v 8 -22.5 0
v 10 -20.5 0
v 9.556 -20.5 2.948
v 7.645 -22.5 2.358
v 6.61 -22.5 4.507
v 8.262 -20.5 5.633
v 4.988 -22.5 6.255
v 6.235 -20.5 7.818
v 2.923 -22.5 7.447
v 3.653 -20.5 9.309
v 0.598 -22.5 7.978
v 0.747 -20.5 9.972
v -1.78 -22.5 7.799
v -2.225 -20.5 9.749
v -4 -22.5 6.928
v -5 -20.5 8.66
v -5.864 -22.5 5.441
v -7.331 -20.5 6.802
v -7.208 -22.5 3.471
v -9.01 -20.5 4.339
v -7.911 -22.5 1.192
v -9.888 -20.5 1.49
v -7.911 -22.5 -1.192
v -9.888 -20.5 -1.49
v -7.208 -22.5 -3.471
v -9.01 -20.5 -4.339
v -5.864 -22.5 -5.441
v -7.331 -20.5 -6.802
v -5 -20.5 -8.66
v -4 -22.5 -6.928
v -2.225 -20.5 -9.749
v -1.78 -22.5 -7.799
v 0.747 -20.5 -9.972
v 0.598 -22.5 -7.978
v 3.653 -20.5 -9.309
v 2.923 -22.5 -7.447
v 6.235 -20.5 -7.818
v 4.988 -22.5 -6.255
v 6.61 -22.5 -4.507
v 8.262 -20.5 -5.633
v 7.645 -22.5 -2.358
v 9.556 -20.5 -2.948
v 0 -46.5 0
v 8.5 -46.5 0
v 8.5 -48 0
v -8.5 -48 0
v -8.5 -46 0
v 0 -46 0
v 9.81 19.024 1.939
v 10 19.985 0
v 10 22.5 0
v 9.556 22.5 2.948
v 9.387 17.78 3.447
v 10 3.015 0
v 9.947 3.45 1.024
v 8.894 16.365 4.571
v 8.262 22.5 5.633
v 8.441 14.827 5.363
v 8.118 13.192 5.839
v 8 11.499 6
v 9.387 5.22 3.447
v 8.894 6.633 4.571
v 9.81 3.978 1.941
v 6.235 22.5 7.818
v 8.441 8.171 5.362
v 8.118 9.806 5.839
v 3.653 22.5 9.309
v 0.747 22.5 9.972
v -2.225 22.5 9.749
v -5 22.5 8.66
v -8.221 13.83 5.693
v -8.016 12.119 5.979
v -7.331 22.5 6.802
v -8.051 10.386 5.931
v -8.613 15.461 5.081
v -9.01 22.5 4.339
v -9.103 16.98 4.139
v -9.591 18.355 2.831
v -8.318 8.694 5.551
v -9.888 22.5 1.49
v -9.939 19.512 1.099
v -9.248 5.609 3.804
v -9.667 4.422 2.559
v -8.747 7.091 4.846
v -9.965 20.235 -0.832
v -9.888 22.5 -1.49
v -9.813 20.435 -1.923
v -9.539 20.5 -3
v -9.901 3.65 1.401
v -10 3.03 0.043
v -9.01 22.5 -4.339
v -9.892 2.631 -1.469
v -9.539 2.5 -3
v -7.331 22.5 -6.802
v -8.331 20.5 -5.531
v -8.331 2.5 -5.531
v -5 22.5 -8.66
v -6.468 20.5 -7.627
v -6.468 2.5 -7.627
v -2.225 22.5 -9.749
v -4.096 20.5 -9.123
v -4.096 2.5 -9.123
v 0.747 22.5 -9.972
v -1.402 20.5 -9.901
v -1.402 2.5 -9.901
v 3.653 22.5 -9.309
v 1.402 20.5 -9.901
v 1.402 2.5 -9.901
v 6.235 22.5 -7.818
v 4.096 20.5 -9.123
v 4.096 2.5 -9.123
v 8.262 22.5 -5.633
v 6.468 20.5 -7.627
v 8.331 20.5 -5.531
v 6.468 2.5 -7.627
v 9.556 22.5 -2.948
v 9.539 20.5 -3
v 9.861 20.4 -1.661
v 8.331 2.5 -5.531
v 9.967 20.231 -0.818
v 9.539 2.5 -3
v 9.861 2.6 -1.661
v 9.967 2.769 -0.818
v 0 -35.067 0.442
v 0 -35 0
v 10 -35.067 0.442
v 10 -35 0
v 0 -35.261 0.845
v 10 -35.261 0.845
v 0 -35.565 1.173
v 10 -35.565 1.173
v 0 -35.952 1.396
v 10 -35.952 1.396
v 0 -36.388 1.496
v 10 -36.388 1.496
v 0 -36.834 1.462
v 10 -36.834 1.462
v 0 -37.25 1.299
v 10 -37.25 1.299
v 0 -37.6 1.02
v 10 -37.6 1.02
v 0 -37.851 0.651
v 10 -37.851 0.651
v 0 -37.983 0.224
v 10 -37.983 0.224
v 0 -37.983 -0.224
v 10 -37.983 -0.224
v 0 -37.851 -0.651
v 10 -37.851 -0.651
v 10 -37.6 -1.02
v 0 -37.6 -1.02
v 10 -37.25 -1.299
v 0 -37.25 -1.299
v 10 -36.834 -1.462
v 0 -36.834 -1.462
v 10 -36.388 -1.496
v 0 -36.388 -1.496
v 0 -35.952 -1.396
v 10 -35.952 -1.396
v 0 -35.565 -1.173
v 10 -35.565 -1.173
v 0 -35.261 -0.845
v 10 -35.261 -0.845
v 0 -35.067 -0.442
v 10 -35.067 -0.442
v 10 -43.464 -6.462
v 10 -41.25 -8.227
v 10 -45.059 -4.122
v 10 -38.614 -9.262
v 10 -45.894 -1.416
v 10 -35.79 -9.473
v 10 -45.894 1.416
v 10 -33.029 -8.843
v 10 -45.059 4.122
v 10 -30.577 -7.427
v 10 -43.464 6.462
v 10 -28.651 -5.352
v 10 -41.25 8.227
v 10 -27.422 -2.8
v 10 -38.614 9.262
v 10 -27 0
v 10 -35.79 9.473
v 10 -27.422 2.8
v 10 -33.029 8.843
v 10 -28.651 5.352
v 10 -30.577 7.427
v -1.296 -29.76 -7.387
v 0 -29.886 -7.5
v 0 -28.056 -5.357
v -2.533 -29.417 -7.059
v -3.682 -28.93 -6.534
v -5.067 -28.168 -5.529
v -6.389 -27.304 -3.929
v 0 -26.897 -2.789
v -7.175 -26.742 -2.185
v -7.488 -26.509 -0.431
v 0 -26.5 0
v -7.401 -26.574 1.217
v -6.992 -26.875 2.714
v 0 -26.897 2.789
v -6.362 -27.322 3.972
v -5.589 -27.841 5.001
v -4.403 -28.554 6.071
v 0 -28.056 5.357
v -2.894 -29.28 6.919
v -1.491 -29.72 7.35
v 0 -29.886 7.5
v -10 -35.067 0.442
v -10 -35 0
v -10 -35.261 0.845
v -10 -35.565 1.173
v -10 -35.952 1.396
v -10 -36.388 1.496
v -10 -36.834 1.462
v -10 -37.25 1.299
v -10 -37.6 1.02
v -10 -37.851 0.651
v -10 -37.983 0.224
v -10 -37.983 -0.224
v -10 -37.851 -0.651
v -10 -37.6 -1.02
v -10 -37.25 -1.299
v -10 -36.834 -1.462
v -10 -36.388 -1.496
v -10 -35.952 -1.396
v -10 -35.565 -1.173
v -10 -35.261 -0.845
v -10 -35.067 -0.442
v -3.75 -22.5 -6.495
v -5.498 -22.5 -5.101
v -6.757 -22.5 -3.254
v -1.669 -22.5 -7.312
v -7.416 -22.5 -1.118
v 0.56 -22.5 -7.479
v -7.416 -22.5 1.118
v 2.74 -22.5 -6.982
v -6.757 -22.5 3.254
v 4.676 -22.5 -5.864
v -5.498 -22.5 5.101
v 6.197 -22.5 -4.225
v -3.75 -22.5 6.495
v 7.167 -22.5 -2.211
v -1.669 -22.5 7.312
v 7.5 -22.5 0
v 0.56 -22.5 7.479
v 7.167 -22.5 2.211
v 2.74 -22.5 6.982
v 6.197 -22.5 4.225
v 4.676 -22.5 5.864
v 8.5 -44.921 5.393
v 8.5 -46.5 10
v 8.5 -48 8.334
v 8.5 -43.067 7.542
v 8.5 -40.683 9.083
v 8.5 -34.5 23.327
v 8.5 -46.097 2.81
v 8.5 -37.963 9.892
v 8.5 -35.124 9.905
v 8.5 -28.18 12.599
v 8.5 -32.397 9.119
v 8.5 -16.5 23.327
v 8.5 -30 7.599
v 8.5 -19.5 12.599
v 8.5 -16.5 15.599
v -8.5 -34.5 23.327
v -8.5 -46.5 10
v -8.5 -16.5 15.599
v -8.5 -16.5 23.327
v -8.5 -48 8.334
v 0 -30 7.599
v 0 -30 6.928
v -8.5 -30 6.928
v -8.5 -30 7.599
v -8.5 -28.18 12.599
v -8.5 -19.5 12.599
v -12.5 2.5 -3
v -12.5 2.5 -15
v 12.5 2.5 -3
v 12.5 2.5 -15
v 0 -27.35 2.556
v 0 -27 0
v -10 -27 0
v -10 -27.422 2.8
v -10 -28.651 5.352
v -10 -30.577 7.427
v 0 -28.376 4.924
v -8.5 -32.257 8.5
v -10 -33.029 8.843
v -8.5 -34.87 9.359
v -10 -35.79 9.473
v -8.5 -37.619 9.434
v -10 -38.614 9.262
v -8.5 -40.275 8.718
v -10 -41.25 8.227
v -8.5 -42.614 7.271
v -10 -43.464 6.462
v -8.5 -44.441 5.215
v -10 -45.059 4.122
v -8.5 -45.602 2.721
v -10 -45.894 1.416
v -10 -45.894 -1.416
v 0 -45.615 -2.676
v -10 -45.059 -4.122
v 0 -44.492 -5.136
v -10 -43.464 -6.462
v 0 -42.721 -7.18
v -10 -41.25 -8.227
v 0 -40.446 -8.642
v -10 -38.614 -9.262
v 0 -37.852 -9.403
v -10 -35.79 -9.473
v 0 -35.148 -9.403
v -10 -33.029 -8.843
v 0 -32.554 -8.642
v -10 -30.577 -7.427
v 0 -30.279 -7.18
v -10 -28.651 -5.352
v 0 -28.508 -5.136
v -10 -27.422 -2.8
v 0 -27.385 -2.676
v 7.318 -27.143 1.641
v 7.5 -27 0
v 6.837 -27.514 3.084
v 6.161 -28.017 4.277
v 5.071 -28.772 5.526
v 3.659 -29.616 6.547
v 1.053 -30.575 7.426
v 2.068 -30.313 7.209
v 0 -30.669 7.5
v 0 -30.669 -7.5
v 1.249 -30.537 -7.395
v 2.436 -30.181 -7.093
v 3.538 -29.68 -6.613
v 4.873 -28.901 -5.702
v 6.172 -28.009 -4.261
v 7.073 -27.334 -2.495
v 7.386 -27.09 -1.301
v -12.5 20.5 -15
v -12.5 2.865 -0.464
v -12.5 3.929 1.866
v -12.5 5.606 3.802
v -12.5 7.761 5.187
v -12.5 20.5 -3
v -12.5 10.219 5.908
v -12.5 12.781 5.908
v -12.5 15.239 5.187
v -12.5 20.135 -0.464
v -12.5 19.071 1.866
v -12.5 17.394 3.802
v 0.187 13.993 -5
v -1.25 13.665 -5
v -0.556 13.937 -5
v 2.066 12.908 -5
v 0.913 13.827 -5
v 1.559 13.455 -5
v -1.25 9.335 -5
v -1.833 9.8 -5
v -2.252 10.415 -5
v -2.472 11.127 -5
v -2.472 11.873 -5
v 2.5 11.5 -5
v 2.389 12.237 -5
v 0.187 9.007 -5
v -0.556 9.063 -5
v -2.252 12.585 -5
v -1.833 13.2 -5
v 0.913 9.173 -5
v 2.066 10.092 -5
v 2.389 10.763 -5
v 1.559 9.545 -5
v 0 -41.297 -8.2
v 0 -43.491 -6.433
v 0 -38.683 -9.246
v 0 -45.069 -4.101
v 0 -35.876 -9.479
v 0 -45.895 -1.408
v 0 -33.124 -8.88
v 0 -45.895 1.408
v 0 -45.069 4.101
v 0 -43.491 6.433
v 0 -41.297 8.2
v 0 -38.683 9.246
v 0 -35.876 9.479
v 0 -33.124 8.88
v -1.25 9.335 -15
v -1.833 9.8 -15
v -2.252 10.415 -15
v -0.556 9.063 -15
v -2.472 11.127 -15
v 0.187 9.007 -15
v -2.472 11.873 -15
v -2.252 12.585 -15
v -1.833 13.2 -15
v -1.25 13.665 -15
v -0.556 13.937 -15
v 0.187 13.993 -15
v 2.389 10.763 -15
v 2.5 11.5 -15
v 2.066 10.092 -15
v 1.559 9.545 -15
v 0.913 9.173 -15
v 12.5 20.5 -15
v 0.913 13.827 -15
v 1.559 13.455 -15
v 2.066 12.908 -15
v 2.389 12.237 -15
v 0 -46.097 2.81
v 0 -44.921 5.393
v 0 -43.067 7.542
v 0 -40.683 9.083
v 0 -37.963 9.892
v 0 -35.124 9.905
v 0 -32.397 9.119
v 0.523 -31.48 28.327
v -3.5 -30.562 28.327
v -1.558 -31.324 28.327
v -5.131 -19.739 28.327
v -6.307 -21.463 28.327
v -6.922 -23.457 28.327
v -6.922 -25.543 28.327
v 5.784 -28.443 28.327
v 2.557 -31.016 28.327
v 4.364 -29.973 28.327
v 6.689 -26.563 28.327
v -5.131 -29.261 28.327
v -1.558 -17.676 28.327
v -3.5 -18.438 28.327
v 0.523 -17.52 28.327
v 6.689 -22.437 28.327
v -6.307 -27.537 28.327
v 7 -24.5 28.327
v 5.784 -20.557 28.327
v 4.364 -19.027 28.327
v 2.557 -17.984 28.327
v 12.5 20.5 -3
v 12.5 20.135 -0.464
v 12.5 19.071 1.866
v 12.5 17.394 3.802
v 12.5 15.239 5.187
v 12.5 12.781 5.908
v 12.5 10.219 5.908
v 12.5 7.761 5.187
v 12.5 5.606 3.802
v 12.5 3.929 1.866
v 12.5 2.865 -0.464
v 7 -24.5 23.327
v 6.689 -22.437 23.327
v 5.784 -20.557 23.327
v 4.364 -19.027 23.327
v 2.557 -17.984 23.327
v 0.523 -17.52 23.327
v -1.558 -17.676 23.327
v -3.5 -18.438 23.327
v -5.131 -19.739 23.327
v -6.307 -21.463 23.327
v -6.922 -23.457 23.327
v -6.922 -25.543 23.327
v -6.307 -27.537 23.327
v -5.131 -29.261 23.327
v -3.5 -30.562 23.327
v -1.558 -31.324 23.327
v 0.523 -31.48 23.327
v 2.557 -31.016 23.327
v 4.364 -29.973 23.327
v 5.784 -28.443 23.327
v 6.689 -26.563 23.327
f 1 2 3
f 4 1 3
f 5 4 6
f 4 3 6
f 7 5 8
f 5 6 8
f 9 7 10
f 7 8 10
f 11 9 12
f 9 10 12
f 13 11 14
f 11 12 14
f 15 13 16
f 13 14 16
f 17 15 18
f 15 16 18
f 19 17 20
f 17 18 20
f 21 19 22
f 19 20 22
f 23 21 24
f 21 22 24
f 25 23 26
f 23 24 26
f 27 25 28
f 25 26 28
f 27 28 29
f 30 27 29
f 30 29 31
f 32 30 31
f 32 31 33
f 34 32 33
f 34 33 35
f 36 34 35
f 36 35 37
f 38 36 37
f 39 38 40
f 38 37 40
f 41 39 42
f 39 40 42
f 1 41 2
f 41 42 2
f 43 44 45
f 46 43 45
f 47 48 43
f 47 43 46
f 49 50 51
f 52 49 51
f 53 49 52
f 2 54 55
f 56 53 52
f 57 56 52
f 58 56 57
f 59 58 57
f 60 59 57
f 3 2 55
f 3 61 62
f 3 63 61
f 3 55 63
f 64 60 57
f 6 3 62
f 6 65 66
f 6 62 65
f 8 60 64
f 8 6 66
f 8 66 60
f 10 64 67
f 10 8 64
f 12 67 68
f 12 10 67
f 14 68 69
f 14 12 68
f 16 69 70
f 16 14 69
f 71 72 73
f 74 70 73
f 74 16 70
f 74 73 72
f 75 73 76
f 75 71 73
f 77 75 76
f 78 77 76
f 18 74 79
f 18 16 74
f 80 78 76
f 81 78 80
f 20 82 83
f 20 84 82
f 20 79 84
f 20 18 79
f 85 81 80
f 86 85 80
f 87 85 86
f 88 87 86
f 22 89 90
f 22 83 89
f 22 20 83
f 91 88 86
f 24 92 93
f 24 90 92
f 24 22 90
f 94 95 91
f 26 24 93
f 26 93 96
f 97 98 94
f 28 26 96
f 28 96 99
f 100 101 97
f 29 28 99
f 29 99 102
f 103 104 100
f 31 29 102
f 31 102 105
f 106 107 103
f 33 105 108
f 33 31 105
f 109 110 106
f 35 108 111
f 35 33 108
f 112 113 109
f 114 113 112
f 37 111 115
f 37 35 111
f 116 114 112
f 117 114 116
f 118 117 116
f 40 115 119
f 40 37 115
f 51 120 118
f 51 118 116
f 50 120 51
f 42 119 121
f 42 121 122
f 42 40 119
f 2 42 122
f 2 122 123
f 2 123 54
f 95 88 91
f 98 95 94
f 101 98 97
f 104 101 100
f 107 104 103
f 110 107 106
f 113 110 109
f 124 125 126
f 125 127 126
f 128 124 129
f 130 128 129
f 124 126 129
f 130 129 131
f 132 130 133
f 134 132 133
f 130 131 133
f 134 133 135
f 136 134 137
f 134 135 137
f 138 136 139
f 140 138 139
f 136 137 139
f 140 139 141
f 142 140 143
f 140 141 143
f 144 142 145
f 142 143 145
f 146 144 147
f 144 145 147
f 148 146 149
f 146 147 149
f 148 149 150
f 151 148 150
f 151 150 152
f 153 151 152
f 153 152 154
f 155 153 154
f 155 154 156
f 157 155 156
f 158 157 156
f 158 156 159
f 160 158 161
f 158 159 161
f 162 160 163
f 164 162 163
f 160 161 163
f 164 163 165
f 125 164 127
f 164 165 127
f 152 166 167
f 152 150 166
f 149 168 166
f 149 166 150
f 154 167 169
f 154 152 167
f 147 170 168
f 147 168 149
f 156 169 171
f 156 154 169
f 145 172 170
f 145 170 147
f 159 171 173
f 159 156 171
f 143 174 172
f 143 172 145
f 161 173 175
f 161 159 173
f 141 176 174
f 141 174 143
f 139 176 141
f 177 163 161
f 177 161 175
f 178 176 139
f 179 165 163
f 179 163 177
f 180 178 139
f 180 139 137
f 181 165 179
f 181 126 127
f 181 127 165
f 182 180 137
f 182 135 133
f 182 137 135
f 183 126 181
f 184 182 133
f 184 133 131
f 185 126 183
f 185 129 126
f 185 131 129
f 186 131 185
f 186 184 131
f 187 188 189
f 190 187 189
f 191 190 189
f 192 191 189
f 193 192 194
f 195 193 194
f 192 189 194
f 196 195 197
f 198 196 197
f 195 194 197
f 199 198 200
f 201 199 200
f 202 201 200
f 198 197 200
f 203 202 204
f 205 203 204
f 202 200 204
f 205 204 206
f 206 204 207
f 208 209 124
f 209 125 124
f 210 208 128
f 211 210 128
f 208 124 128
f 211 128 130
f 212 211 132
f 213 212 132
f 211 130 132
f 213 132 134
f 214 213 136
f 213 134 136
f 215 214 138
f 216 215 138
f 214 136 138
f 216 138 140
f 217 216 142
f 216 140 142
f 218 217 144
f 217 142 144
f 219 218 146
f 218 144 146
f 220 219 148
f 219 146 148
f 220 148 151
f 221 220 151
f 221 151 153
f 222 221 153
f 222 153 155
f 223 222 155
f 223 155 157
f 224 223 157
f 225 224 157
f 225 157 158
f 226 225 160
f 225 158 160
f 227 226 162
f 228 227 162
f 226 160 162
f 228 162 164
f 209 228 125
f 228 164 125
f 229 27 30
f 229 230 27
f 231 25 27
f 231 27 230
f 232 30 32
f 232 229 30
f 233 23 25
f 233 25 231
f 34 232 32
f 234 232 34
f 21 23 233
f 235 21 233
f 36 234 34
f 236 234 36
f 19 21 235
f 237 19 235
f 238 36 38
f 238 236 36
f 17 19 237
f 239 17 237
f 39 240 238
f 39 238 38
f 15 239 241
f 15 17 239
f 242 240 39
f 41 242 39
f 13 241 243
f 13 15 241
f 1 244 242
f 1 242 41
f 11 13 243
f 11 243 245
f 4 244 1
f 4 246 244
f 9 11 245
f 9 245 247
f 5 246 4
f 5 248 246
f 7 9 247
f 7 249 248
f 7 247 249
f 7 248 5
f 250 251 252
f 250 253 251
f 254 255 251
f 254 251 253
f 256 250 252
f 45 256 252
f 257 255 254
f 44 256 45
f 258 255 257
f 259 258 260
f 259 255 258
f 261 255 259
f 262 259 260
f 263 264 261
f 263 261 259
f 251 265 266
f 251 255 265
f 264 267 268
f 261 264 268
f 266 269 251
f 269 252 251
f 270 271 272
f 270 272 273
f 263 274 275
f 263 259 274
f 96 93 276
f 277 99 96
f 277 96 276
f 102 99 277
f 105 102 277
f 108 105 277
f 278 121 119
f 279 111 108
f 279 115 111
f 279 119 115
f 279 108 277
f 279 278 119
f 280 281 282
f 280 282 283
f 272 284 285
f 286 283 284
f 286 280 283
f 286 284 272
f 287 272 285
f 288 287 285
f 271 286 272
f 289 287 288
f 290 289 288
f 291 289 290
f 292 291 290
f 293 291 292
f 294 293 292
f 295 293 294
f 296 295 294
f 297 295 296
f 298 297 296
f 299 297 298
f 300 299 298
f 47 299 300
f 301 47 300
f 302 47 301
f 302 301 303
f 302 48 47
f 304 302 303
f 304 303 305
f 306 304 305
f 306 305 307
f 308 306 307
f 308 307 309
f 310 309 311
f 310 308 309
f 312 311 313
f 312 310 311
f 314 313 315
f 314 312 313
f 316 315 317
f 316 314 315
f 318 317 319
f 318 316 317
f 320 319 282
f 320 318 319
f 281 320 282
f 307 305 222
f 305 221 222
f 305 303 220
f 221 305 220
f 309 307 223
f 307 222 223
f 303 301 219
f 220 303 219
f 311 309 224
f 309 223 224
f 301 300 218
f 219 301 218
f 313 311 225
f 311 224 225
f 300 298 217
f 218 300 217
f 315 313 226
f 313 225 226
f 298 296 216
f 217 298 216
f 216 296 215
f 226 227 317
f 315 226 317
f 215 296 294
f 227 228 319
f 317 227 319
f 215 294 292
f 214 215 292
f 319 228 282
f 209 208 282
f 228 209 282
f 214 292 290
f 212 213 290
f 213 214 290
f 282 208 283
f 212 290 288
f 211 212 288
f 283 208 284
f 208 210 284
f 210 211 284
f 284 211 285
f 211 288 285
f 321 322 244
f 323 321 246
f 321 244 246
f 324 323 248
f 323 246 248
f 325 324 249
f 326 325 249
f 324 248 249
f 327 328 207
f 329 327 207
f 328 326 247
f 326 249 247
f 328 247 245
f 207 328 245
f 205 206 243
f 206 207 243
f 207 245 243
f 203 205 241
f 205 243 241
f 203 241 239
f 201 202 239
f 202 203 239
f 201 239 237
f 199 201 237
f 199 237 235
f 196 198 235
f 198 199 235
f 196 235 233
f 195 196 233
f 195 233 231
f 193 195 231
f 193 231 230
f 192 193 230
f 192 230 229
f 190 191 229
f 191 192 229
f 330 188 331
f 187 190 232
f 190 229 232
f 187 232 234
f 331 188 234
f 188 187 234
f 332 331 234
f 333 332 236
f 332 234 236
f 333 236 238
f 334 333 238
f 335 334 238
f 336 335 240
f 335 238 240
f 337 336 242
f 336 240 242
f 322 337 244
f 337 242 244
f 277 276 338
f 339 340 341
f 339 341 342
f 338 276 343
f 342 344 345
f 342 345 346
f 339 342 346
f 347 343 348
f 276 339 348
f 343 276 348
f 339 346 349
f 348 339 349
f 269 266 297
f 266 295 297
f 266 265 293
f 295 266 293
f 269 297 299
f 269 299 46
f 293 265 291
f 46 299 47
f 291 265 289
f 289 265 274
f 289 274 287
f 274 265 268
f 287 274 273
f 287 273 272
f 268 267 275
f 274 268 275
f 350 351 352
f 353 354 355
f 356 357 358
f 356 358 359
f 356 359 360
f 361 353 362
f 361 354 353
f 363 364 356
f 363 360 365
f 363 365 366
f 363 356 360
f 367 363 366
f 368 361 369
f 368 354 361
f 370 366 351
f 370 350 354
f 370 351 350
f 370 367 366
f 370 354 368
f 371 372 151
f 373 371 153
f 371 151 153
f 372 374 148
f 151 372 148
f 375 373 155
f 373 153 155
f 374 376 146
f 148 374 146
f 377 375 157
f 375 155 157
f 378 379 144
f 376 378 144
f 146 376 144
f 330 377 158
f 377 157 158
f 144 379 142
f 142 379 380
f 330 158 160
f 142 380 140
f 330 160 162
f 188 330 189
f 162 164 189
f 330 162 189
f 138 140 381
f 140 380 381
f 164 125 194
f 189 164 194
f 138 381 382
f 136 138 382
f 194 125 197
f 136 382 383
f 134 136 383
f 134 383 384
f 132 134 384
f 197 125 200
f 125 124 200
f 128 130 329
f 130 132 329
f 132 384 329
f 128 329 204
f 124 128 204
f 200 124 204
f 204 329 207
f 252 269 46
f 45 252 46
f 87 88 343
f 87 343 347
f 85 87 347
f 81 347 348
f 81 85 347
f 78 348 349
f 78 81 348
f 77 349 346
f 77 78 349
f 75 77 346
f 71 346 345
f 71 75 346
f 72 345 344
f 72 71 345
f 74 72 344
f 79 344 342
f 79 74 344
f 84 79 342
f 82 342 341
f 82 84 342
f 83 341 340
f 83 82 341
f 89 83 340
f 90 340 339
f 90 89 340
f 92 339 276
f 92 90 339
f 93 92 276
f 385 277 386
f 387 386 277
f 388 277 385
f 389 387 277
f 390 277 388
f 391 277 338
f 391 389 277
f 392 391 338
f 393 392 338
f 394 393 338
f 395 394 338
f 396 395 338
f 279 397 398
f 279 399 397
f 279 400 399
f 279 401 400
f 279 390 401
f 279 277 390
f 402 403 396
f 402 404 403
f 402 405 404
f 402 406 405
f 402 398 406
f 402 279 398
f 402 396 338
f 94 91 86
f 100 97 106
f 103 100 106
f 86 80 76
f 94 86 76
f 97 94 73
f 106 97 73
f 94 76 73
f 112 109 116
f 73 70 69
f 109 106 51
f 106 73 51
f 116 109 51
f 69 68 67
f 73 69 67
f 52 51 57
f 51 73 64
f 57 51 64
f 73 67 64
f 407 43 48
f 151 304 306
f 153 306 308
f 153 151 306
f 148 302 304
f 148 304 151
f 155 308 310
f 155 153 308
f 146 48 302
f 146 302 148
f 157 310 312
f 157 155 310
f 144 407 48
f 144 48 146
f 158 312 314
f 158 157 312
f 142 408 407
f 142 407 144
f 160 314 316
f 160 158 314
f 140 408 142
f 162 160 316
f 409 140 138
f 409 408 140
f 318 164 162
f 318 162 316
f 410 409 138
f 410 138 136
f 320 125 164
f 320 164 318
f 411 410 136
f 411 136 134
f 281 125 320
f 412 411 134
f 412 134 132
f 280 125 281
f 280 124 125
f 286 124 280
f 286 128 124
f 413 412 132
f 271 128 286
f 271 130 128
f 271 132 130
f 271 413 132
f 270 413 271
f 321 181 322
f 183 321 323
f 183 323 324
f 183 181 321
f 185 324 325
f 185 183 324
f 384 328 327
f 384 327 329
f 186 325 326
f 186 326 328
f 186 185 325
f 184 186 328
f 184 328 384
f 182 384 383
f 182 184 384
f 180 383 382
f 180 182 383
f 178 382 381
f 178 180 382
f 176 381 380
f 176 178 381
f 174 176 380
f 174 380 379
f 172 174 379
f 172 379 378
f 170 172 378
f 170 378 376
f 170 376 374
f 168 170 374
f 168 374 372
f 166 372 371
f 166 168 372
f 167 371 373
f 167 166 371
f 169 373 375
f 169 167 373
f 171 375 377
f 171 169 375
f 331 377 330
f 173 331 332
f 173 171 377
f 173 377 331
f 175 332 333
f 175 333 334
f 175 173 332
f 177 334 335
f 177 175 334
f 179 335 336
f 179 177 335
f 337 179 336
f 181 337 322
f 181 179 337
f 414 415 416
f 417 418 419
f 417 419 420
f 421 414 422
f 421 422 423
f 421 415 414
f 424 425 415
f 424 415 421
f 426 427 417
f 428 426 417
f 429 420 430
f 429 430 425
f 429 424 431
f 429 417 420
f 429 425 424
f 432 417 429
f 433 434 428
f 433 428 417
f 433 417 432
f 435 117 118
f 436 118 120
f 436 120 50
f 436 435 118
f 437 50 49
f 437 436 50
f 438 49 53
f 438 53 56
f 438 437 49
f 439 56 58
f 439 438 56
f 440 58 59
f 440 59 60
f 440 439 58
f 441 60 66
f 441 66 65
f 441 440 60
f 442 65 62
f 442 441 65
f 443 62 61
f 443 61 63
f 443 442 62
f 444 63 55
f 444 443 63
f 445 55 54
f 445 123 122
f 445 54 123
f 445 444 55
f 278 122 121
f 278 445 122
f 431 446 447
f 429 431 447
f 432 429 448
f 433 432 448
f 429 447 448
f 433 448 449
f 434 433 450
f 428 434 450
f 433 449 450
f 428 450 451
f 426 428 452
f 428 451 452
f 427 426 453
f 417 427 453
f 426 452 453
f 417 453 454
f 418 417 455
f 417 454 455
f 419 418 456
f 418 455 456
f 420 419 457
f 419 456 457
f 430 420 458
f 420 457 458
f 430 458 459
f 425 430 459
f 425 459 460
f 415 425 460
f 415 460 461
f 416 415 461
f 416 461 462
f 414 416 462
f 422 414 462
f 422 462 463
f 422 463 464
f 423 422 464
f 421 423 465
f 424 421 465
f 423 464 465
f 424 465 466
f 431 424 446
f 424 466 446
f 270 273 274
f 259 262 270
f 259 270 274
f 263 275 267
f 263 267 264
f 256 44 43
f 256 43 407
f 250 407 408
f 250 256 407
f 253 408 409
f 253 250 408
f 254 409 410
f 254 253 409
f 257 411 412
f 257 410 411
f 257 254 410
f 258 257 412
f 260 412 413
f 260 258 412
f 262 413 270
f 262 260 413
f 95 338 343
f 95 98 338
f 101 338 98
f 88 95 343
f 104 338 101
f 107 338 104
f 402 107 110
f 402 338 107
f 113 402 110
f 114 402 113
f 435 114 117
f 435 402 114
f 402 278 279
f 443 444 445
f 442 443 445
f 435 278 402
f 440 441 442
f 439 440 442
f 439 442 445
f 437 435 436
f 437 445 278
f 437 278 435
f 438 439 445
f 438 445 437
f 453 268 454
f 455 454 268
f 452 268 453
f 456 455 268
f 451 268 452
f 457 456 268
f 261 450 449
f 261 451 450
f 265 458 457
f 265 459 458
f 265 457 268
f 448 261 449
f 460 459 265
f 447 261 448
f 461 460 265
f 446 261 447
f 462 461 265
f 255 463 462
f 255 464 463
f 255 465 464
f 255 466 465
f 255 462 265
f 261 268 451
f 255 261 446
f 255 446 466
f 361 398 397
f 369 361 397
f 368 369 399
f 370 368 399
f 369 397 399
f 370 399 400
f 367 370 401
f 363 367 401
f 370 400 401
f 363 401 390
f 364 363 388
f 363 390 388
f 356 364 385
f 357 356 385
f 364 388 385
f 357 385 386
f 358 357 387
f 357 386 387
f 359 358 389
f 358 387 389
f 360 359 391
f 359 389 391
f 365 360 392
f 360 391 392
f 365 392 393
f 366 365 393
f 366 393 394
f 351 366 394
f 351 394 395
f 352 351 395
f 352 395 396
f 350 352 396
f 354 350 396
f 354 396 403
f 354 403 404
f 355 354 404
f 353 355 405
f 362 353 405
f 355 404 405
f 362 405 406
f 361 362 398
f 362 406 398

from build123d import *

# Parameters (mm, degrees)
F0_R      = 10
F1_DEPTH  = 22.5
F2_R      = 7.5
F3_DEPTH  = 10
F4_R      = 9.5
F5_DEPTH  = 10
F6_SIZE   = 2
F8_DEPTH  = 8.5
F9_R      = 7
F10_DEPTH = 5
F11_R     = 10
F12_DEPTH = 25
F13_R     = 9.5
F14_DEPTH = 10
F16_DEPTH = 8.5
F17_DEPTH = 1.5
F19_DEPTH = 12.5
F20_R     = 1.5
F21_DEPTH = 12.5
F23_DEPTH = 12.5
F24_R     = 2.5
F25_DEPTH = 10
F26_SIZE  = 3


with BuildPart() as f1:
    # F0 (on Front) → F1 (new body, symmetric)
    with BuildSketch(Plane.XZ):
        Circle(F0_R)
    extrude(amount=F1_DEPTH, both=True)

    # F2 (on face) → F3 (join)
    with BuildSketch(Plane.XZ.offset(22.5)):
        Circle(F2_R)
    extrude(amount=F3_DEPTH)

    # F4 (on Right) → F5 (join, symmetric)
    with BuildSketch(Plane.YZ):
        with Locations((-36.5, 0)):
            Circle(F4_R)
    extrude(amount=F5_DEPTH, both=True)

    # F6
    f6_edges = [f1.edges().sort_by_distance(p)[0] for p in [
        (-10, -22.5, 0),
    ]]
    chamfer(f6_edges, length=F6_SIZE)

    # F11 (on Right) → F12 (cut)
    with BuildSketch(Plane.YZ):
        with Locations((-36.5, 0)):
            Circle(F11_R)
    extrude(amount=-F12_DEPTH, mode=Mode.SUBTRACT)


with BuildPart() as f8:
    # F7 (on Right) → F8 (new body, symmetric)
    with BuildSketch(Plane.YZ):
        with BuildLine():
            ThreePointArc((-46.5, 0), (-40.6833001327, 9.0829510623), (-30, 7.5993420768))
            Line((-30, 7.5993420768), (-28.1801488287, 12.5993420768))
            Line((-28.1801488287, 12.5993420768), (-16.5, 12.5993420768))
            Line((-16.5, 12.5993420768), (-16.5, 23.327350178))
            Line((-16.5, 23.327350178), (-34.5, 23.327350178))
            Line((-34.5, 23.327350178), (-46.5, 10))
            Line((-46.5, 10), (-46.5, 0))
        make_face()
    extrude(amount=F8_DEPTH, both=True)

    # F9 (on face) → F10 (join)
    with BuildSketch(Plane.XY.offset(23.327350178)):
        with Locations((0, -24.5)):
            Circle(F9_R)
    extrude(amount=F10_DEPTH)

    # F17 (add): a face of the model
    f17_faces = [f8.faces().sort_by_distance(p)[0] for p in [
        (0, -46.5, 5),
    ]]


with BuildPart() as f14:
    # F13 (on Right) → F14 (new body)
    with BuildSketch(Plane.YZ):
        with Locations((-36.5, 0)):
            Circle(F13_R)
    extrude(amount=-F14_DEPTH)

    # F15 (on Right) → F16 (join, through all)
    with BuildSketch(Plane.YZ):
        with BuildLine():
            Line((-30, 6.9282032303), (-30, 7.5993420768))
            ThreePointArc((-30, 7.5993420768), (-40.6833001327, 9.0829510623), (-46.5, 0))
            Line((-46.5, 0), (-46, 0))
            ThreePointArc((-46, 0), (-32.7250827824, -8.7177978871), (-30, 6.9282032303))
        make_face()
    extrude(amount=-F16_DEPTH)


with BuildPart() as f8_1:
    add(f8.part)

    add(f14.part)  # F17 merges F14
    extrude(f17_faces, amount=F17_DEPTH)

    # F18 (on Right) → F19 (cut, symmetric)
    with BuildSketch(Plane.YZ):
        Polygon((-51.5, 4.4469374259), (-46.5, 10), (-51.5, 10), align=None)
    extrude(amount=F19_DEPTH, both=True, mode=Mode.SUBTRACT)


with BuildPart() as f21_tool:
    # F20 (on Right) → F21 (new body, symmetric)
    with BuildSketch(Plane.YZ):
        with Locations((-36.5, 0)):
            Circle(F20_R)
    extrude(amount=F21_DEPTH, both=True)


with BuildPart() as f1_1:
    add(f1.part)

    # F21: cut by f21_tool
    add(f21_tool.part, mode=Mode.SUBTRACT)

    # F22 (on Right) → F23 (join, symmetric)
    with BuildSketch(Plane.YZ):
        with BuildLine():
            Line((20.5, -15), (20.5, -3))
            ThreePointArc((20.5, -3), (11.5, 6), (2.5, -3))
            Line((2.5, -3), (2.5, -15))
            Line((2.5, -15), (20.5, -15))
        make_face()
    extrude(amount=F23_DEPTH, both=True)

    # F24 (on face) → F25 (cut)
    with BuildSketch(Plane(origin=(0, 0, -15), x_dir=(1, 0, 0), z_dir=(0, 0, -1))):
        with Locations((0, -11.5)):
            Circle(F24_R)
    extrude(amount=-F25_DEPTH, mode=Mode.SUBTRACT)


with BuildPart() as f8_2:
    add(f8_1.part)

    # F21: cut by f21_tool
    add(f21_tool.part, mode=Mode.SUBTRACT)

    # F26
    f26_edges = [f8_2.edges().sort_by_distance(p)[0] for p in [
        (0, -16.5, 12.599342),
    ]]
    chamfer(f26_edges, length=F26_SIZE)


solid = Compound([f1_1.part, f8_2.part])
